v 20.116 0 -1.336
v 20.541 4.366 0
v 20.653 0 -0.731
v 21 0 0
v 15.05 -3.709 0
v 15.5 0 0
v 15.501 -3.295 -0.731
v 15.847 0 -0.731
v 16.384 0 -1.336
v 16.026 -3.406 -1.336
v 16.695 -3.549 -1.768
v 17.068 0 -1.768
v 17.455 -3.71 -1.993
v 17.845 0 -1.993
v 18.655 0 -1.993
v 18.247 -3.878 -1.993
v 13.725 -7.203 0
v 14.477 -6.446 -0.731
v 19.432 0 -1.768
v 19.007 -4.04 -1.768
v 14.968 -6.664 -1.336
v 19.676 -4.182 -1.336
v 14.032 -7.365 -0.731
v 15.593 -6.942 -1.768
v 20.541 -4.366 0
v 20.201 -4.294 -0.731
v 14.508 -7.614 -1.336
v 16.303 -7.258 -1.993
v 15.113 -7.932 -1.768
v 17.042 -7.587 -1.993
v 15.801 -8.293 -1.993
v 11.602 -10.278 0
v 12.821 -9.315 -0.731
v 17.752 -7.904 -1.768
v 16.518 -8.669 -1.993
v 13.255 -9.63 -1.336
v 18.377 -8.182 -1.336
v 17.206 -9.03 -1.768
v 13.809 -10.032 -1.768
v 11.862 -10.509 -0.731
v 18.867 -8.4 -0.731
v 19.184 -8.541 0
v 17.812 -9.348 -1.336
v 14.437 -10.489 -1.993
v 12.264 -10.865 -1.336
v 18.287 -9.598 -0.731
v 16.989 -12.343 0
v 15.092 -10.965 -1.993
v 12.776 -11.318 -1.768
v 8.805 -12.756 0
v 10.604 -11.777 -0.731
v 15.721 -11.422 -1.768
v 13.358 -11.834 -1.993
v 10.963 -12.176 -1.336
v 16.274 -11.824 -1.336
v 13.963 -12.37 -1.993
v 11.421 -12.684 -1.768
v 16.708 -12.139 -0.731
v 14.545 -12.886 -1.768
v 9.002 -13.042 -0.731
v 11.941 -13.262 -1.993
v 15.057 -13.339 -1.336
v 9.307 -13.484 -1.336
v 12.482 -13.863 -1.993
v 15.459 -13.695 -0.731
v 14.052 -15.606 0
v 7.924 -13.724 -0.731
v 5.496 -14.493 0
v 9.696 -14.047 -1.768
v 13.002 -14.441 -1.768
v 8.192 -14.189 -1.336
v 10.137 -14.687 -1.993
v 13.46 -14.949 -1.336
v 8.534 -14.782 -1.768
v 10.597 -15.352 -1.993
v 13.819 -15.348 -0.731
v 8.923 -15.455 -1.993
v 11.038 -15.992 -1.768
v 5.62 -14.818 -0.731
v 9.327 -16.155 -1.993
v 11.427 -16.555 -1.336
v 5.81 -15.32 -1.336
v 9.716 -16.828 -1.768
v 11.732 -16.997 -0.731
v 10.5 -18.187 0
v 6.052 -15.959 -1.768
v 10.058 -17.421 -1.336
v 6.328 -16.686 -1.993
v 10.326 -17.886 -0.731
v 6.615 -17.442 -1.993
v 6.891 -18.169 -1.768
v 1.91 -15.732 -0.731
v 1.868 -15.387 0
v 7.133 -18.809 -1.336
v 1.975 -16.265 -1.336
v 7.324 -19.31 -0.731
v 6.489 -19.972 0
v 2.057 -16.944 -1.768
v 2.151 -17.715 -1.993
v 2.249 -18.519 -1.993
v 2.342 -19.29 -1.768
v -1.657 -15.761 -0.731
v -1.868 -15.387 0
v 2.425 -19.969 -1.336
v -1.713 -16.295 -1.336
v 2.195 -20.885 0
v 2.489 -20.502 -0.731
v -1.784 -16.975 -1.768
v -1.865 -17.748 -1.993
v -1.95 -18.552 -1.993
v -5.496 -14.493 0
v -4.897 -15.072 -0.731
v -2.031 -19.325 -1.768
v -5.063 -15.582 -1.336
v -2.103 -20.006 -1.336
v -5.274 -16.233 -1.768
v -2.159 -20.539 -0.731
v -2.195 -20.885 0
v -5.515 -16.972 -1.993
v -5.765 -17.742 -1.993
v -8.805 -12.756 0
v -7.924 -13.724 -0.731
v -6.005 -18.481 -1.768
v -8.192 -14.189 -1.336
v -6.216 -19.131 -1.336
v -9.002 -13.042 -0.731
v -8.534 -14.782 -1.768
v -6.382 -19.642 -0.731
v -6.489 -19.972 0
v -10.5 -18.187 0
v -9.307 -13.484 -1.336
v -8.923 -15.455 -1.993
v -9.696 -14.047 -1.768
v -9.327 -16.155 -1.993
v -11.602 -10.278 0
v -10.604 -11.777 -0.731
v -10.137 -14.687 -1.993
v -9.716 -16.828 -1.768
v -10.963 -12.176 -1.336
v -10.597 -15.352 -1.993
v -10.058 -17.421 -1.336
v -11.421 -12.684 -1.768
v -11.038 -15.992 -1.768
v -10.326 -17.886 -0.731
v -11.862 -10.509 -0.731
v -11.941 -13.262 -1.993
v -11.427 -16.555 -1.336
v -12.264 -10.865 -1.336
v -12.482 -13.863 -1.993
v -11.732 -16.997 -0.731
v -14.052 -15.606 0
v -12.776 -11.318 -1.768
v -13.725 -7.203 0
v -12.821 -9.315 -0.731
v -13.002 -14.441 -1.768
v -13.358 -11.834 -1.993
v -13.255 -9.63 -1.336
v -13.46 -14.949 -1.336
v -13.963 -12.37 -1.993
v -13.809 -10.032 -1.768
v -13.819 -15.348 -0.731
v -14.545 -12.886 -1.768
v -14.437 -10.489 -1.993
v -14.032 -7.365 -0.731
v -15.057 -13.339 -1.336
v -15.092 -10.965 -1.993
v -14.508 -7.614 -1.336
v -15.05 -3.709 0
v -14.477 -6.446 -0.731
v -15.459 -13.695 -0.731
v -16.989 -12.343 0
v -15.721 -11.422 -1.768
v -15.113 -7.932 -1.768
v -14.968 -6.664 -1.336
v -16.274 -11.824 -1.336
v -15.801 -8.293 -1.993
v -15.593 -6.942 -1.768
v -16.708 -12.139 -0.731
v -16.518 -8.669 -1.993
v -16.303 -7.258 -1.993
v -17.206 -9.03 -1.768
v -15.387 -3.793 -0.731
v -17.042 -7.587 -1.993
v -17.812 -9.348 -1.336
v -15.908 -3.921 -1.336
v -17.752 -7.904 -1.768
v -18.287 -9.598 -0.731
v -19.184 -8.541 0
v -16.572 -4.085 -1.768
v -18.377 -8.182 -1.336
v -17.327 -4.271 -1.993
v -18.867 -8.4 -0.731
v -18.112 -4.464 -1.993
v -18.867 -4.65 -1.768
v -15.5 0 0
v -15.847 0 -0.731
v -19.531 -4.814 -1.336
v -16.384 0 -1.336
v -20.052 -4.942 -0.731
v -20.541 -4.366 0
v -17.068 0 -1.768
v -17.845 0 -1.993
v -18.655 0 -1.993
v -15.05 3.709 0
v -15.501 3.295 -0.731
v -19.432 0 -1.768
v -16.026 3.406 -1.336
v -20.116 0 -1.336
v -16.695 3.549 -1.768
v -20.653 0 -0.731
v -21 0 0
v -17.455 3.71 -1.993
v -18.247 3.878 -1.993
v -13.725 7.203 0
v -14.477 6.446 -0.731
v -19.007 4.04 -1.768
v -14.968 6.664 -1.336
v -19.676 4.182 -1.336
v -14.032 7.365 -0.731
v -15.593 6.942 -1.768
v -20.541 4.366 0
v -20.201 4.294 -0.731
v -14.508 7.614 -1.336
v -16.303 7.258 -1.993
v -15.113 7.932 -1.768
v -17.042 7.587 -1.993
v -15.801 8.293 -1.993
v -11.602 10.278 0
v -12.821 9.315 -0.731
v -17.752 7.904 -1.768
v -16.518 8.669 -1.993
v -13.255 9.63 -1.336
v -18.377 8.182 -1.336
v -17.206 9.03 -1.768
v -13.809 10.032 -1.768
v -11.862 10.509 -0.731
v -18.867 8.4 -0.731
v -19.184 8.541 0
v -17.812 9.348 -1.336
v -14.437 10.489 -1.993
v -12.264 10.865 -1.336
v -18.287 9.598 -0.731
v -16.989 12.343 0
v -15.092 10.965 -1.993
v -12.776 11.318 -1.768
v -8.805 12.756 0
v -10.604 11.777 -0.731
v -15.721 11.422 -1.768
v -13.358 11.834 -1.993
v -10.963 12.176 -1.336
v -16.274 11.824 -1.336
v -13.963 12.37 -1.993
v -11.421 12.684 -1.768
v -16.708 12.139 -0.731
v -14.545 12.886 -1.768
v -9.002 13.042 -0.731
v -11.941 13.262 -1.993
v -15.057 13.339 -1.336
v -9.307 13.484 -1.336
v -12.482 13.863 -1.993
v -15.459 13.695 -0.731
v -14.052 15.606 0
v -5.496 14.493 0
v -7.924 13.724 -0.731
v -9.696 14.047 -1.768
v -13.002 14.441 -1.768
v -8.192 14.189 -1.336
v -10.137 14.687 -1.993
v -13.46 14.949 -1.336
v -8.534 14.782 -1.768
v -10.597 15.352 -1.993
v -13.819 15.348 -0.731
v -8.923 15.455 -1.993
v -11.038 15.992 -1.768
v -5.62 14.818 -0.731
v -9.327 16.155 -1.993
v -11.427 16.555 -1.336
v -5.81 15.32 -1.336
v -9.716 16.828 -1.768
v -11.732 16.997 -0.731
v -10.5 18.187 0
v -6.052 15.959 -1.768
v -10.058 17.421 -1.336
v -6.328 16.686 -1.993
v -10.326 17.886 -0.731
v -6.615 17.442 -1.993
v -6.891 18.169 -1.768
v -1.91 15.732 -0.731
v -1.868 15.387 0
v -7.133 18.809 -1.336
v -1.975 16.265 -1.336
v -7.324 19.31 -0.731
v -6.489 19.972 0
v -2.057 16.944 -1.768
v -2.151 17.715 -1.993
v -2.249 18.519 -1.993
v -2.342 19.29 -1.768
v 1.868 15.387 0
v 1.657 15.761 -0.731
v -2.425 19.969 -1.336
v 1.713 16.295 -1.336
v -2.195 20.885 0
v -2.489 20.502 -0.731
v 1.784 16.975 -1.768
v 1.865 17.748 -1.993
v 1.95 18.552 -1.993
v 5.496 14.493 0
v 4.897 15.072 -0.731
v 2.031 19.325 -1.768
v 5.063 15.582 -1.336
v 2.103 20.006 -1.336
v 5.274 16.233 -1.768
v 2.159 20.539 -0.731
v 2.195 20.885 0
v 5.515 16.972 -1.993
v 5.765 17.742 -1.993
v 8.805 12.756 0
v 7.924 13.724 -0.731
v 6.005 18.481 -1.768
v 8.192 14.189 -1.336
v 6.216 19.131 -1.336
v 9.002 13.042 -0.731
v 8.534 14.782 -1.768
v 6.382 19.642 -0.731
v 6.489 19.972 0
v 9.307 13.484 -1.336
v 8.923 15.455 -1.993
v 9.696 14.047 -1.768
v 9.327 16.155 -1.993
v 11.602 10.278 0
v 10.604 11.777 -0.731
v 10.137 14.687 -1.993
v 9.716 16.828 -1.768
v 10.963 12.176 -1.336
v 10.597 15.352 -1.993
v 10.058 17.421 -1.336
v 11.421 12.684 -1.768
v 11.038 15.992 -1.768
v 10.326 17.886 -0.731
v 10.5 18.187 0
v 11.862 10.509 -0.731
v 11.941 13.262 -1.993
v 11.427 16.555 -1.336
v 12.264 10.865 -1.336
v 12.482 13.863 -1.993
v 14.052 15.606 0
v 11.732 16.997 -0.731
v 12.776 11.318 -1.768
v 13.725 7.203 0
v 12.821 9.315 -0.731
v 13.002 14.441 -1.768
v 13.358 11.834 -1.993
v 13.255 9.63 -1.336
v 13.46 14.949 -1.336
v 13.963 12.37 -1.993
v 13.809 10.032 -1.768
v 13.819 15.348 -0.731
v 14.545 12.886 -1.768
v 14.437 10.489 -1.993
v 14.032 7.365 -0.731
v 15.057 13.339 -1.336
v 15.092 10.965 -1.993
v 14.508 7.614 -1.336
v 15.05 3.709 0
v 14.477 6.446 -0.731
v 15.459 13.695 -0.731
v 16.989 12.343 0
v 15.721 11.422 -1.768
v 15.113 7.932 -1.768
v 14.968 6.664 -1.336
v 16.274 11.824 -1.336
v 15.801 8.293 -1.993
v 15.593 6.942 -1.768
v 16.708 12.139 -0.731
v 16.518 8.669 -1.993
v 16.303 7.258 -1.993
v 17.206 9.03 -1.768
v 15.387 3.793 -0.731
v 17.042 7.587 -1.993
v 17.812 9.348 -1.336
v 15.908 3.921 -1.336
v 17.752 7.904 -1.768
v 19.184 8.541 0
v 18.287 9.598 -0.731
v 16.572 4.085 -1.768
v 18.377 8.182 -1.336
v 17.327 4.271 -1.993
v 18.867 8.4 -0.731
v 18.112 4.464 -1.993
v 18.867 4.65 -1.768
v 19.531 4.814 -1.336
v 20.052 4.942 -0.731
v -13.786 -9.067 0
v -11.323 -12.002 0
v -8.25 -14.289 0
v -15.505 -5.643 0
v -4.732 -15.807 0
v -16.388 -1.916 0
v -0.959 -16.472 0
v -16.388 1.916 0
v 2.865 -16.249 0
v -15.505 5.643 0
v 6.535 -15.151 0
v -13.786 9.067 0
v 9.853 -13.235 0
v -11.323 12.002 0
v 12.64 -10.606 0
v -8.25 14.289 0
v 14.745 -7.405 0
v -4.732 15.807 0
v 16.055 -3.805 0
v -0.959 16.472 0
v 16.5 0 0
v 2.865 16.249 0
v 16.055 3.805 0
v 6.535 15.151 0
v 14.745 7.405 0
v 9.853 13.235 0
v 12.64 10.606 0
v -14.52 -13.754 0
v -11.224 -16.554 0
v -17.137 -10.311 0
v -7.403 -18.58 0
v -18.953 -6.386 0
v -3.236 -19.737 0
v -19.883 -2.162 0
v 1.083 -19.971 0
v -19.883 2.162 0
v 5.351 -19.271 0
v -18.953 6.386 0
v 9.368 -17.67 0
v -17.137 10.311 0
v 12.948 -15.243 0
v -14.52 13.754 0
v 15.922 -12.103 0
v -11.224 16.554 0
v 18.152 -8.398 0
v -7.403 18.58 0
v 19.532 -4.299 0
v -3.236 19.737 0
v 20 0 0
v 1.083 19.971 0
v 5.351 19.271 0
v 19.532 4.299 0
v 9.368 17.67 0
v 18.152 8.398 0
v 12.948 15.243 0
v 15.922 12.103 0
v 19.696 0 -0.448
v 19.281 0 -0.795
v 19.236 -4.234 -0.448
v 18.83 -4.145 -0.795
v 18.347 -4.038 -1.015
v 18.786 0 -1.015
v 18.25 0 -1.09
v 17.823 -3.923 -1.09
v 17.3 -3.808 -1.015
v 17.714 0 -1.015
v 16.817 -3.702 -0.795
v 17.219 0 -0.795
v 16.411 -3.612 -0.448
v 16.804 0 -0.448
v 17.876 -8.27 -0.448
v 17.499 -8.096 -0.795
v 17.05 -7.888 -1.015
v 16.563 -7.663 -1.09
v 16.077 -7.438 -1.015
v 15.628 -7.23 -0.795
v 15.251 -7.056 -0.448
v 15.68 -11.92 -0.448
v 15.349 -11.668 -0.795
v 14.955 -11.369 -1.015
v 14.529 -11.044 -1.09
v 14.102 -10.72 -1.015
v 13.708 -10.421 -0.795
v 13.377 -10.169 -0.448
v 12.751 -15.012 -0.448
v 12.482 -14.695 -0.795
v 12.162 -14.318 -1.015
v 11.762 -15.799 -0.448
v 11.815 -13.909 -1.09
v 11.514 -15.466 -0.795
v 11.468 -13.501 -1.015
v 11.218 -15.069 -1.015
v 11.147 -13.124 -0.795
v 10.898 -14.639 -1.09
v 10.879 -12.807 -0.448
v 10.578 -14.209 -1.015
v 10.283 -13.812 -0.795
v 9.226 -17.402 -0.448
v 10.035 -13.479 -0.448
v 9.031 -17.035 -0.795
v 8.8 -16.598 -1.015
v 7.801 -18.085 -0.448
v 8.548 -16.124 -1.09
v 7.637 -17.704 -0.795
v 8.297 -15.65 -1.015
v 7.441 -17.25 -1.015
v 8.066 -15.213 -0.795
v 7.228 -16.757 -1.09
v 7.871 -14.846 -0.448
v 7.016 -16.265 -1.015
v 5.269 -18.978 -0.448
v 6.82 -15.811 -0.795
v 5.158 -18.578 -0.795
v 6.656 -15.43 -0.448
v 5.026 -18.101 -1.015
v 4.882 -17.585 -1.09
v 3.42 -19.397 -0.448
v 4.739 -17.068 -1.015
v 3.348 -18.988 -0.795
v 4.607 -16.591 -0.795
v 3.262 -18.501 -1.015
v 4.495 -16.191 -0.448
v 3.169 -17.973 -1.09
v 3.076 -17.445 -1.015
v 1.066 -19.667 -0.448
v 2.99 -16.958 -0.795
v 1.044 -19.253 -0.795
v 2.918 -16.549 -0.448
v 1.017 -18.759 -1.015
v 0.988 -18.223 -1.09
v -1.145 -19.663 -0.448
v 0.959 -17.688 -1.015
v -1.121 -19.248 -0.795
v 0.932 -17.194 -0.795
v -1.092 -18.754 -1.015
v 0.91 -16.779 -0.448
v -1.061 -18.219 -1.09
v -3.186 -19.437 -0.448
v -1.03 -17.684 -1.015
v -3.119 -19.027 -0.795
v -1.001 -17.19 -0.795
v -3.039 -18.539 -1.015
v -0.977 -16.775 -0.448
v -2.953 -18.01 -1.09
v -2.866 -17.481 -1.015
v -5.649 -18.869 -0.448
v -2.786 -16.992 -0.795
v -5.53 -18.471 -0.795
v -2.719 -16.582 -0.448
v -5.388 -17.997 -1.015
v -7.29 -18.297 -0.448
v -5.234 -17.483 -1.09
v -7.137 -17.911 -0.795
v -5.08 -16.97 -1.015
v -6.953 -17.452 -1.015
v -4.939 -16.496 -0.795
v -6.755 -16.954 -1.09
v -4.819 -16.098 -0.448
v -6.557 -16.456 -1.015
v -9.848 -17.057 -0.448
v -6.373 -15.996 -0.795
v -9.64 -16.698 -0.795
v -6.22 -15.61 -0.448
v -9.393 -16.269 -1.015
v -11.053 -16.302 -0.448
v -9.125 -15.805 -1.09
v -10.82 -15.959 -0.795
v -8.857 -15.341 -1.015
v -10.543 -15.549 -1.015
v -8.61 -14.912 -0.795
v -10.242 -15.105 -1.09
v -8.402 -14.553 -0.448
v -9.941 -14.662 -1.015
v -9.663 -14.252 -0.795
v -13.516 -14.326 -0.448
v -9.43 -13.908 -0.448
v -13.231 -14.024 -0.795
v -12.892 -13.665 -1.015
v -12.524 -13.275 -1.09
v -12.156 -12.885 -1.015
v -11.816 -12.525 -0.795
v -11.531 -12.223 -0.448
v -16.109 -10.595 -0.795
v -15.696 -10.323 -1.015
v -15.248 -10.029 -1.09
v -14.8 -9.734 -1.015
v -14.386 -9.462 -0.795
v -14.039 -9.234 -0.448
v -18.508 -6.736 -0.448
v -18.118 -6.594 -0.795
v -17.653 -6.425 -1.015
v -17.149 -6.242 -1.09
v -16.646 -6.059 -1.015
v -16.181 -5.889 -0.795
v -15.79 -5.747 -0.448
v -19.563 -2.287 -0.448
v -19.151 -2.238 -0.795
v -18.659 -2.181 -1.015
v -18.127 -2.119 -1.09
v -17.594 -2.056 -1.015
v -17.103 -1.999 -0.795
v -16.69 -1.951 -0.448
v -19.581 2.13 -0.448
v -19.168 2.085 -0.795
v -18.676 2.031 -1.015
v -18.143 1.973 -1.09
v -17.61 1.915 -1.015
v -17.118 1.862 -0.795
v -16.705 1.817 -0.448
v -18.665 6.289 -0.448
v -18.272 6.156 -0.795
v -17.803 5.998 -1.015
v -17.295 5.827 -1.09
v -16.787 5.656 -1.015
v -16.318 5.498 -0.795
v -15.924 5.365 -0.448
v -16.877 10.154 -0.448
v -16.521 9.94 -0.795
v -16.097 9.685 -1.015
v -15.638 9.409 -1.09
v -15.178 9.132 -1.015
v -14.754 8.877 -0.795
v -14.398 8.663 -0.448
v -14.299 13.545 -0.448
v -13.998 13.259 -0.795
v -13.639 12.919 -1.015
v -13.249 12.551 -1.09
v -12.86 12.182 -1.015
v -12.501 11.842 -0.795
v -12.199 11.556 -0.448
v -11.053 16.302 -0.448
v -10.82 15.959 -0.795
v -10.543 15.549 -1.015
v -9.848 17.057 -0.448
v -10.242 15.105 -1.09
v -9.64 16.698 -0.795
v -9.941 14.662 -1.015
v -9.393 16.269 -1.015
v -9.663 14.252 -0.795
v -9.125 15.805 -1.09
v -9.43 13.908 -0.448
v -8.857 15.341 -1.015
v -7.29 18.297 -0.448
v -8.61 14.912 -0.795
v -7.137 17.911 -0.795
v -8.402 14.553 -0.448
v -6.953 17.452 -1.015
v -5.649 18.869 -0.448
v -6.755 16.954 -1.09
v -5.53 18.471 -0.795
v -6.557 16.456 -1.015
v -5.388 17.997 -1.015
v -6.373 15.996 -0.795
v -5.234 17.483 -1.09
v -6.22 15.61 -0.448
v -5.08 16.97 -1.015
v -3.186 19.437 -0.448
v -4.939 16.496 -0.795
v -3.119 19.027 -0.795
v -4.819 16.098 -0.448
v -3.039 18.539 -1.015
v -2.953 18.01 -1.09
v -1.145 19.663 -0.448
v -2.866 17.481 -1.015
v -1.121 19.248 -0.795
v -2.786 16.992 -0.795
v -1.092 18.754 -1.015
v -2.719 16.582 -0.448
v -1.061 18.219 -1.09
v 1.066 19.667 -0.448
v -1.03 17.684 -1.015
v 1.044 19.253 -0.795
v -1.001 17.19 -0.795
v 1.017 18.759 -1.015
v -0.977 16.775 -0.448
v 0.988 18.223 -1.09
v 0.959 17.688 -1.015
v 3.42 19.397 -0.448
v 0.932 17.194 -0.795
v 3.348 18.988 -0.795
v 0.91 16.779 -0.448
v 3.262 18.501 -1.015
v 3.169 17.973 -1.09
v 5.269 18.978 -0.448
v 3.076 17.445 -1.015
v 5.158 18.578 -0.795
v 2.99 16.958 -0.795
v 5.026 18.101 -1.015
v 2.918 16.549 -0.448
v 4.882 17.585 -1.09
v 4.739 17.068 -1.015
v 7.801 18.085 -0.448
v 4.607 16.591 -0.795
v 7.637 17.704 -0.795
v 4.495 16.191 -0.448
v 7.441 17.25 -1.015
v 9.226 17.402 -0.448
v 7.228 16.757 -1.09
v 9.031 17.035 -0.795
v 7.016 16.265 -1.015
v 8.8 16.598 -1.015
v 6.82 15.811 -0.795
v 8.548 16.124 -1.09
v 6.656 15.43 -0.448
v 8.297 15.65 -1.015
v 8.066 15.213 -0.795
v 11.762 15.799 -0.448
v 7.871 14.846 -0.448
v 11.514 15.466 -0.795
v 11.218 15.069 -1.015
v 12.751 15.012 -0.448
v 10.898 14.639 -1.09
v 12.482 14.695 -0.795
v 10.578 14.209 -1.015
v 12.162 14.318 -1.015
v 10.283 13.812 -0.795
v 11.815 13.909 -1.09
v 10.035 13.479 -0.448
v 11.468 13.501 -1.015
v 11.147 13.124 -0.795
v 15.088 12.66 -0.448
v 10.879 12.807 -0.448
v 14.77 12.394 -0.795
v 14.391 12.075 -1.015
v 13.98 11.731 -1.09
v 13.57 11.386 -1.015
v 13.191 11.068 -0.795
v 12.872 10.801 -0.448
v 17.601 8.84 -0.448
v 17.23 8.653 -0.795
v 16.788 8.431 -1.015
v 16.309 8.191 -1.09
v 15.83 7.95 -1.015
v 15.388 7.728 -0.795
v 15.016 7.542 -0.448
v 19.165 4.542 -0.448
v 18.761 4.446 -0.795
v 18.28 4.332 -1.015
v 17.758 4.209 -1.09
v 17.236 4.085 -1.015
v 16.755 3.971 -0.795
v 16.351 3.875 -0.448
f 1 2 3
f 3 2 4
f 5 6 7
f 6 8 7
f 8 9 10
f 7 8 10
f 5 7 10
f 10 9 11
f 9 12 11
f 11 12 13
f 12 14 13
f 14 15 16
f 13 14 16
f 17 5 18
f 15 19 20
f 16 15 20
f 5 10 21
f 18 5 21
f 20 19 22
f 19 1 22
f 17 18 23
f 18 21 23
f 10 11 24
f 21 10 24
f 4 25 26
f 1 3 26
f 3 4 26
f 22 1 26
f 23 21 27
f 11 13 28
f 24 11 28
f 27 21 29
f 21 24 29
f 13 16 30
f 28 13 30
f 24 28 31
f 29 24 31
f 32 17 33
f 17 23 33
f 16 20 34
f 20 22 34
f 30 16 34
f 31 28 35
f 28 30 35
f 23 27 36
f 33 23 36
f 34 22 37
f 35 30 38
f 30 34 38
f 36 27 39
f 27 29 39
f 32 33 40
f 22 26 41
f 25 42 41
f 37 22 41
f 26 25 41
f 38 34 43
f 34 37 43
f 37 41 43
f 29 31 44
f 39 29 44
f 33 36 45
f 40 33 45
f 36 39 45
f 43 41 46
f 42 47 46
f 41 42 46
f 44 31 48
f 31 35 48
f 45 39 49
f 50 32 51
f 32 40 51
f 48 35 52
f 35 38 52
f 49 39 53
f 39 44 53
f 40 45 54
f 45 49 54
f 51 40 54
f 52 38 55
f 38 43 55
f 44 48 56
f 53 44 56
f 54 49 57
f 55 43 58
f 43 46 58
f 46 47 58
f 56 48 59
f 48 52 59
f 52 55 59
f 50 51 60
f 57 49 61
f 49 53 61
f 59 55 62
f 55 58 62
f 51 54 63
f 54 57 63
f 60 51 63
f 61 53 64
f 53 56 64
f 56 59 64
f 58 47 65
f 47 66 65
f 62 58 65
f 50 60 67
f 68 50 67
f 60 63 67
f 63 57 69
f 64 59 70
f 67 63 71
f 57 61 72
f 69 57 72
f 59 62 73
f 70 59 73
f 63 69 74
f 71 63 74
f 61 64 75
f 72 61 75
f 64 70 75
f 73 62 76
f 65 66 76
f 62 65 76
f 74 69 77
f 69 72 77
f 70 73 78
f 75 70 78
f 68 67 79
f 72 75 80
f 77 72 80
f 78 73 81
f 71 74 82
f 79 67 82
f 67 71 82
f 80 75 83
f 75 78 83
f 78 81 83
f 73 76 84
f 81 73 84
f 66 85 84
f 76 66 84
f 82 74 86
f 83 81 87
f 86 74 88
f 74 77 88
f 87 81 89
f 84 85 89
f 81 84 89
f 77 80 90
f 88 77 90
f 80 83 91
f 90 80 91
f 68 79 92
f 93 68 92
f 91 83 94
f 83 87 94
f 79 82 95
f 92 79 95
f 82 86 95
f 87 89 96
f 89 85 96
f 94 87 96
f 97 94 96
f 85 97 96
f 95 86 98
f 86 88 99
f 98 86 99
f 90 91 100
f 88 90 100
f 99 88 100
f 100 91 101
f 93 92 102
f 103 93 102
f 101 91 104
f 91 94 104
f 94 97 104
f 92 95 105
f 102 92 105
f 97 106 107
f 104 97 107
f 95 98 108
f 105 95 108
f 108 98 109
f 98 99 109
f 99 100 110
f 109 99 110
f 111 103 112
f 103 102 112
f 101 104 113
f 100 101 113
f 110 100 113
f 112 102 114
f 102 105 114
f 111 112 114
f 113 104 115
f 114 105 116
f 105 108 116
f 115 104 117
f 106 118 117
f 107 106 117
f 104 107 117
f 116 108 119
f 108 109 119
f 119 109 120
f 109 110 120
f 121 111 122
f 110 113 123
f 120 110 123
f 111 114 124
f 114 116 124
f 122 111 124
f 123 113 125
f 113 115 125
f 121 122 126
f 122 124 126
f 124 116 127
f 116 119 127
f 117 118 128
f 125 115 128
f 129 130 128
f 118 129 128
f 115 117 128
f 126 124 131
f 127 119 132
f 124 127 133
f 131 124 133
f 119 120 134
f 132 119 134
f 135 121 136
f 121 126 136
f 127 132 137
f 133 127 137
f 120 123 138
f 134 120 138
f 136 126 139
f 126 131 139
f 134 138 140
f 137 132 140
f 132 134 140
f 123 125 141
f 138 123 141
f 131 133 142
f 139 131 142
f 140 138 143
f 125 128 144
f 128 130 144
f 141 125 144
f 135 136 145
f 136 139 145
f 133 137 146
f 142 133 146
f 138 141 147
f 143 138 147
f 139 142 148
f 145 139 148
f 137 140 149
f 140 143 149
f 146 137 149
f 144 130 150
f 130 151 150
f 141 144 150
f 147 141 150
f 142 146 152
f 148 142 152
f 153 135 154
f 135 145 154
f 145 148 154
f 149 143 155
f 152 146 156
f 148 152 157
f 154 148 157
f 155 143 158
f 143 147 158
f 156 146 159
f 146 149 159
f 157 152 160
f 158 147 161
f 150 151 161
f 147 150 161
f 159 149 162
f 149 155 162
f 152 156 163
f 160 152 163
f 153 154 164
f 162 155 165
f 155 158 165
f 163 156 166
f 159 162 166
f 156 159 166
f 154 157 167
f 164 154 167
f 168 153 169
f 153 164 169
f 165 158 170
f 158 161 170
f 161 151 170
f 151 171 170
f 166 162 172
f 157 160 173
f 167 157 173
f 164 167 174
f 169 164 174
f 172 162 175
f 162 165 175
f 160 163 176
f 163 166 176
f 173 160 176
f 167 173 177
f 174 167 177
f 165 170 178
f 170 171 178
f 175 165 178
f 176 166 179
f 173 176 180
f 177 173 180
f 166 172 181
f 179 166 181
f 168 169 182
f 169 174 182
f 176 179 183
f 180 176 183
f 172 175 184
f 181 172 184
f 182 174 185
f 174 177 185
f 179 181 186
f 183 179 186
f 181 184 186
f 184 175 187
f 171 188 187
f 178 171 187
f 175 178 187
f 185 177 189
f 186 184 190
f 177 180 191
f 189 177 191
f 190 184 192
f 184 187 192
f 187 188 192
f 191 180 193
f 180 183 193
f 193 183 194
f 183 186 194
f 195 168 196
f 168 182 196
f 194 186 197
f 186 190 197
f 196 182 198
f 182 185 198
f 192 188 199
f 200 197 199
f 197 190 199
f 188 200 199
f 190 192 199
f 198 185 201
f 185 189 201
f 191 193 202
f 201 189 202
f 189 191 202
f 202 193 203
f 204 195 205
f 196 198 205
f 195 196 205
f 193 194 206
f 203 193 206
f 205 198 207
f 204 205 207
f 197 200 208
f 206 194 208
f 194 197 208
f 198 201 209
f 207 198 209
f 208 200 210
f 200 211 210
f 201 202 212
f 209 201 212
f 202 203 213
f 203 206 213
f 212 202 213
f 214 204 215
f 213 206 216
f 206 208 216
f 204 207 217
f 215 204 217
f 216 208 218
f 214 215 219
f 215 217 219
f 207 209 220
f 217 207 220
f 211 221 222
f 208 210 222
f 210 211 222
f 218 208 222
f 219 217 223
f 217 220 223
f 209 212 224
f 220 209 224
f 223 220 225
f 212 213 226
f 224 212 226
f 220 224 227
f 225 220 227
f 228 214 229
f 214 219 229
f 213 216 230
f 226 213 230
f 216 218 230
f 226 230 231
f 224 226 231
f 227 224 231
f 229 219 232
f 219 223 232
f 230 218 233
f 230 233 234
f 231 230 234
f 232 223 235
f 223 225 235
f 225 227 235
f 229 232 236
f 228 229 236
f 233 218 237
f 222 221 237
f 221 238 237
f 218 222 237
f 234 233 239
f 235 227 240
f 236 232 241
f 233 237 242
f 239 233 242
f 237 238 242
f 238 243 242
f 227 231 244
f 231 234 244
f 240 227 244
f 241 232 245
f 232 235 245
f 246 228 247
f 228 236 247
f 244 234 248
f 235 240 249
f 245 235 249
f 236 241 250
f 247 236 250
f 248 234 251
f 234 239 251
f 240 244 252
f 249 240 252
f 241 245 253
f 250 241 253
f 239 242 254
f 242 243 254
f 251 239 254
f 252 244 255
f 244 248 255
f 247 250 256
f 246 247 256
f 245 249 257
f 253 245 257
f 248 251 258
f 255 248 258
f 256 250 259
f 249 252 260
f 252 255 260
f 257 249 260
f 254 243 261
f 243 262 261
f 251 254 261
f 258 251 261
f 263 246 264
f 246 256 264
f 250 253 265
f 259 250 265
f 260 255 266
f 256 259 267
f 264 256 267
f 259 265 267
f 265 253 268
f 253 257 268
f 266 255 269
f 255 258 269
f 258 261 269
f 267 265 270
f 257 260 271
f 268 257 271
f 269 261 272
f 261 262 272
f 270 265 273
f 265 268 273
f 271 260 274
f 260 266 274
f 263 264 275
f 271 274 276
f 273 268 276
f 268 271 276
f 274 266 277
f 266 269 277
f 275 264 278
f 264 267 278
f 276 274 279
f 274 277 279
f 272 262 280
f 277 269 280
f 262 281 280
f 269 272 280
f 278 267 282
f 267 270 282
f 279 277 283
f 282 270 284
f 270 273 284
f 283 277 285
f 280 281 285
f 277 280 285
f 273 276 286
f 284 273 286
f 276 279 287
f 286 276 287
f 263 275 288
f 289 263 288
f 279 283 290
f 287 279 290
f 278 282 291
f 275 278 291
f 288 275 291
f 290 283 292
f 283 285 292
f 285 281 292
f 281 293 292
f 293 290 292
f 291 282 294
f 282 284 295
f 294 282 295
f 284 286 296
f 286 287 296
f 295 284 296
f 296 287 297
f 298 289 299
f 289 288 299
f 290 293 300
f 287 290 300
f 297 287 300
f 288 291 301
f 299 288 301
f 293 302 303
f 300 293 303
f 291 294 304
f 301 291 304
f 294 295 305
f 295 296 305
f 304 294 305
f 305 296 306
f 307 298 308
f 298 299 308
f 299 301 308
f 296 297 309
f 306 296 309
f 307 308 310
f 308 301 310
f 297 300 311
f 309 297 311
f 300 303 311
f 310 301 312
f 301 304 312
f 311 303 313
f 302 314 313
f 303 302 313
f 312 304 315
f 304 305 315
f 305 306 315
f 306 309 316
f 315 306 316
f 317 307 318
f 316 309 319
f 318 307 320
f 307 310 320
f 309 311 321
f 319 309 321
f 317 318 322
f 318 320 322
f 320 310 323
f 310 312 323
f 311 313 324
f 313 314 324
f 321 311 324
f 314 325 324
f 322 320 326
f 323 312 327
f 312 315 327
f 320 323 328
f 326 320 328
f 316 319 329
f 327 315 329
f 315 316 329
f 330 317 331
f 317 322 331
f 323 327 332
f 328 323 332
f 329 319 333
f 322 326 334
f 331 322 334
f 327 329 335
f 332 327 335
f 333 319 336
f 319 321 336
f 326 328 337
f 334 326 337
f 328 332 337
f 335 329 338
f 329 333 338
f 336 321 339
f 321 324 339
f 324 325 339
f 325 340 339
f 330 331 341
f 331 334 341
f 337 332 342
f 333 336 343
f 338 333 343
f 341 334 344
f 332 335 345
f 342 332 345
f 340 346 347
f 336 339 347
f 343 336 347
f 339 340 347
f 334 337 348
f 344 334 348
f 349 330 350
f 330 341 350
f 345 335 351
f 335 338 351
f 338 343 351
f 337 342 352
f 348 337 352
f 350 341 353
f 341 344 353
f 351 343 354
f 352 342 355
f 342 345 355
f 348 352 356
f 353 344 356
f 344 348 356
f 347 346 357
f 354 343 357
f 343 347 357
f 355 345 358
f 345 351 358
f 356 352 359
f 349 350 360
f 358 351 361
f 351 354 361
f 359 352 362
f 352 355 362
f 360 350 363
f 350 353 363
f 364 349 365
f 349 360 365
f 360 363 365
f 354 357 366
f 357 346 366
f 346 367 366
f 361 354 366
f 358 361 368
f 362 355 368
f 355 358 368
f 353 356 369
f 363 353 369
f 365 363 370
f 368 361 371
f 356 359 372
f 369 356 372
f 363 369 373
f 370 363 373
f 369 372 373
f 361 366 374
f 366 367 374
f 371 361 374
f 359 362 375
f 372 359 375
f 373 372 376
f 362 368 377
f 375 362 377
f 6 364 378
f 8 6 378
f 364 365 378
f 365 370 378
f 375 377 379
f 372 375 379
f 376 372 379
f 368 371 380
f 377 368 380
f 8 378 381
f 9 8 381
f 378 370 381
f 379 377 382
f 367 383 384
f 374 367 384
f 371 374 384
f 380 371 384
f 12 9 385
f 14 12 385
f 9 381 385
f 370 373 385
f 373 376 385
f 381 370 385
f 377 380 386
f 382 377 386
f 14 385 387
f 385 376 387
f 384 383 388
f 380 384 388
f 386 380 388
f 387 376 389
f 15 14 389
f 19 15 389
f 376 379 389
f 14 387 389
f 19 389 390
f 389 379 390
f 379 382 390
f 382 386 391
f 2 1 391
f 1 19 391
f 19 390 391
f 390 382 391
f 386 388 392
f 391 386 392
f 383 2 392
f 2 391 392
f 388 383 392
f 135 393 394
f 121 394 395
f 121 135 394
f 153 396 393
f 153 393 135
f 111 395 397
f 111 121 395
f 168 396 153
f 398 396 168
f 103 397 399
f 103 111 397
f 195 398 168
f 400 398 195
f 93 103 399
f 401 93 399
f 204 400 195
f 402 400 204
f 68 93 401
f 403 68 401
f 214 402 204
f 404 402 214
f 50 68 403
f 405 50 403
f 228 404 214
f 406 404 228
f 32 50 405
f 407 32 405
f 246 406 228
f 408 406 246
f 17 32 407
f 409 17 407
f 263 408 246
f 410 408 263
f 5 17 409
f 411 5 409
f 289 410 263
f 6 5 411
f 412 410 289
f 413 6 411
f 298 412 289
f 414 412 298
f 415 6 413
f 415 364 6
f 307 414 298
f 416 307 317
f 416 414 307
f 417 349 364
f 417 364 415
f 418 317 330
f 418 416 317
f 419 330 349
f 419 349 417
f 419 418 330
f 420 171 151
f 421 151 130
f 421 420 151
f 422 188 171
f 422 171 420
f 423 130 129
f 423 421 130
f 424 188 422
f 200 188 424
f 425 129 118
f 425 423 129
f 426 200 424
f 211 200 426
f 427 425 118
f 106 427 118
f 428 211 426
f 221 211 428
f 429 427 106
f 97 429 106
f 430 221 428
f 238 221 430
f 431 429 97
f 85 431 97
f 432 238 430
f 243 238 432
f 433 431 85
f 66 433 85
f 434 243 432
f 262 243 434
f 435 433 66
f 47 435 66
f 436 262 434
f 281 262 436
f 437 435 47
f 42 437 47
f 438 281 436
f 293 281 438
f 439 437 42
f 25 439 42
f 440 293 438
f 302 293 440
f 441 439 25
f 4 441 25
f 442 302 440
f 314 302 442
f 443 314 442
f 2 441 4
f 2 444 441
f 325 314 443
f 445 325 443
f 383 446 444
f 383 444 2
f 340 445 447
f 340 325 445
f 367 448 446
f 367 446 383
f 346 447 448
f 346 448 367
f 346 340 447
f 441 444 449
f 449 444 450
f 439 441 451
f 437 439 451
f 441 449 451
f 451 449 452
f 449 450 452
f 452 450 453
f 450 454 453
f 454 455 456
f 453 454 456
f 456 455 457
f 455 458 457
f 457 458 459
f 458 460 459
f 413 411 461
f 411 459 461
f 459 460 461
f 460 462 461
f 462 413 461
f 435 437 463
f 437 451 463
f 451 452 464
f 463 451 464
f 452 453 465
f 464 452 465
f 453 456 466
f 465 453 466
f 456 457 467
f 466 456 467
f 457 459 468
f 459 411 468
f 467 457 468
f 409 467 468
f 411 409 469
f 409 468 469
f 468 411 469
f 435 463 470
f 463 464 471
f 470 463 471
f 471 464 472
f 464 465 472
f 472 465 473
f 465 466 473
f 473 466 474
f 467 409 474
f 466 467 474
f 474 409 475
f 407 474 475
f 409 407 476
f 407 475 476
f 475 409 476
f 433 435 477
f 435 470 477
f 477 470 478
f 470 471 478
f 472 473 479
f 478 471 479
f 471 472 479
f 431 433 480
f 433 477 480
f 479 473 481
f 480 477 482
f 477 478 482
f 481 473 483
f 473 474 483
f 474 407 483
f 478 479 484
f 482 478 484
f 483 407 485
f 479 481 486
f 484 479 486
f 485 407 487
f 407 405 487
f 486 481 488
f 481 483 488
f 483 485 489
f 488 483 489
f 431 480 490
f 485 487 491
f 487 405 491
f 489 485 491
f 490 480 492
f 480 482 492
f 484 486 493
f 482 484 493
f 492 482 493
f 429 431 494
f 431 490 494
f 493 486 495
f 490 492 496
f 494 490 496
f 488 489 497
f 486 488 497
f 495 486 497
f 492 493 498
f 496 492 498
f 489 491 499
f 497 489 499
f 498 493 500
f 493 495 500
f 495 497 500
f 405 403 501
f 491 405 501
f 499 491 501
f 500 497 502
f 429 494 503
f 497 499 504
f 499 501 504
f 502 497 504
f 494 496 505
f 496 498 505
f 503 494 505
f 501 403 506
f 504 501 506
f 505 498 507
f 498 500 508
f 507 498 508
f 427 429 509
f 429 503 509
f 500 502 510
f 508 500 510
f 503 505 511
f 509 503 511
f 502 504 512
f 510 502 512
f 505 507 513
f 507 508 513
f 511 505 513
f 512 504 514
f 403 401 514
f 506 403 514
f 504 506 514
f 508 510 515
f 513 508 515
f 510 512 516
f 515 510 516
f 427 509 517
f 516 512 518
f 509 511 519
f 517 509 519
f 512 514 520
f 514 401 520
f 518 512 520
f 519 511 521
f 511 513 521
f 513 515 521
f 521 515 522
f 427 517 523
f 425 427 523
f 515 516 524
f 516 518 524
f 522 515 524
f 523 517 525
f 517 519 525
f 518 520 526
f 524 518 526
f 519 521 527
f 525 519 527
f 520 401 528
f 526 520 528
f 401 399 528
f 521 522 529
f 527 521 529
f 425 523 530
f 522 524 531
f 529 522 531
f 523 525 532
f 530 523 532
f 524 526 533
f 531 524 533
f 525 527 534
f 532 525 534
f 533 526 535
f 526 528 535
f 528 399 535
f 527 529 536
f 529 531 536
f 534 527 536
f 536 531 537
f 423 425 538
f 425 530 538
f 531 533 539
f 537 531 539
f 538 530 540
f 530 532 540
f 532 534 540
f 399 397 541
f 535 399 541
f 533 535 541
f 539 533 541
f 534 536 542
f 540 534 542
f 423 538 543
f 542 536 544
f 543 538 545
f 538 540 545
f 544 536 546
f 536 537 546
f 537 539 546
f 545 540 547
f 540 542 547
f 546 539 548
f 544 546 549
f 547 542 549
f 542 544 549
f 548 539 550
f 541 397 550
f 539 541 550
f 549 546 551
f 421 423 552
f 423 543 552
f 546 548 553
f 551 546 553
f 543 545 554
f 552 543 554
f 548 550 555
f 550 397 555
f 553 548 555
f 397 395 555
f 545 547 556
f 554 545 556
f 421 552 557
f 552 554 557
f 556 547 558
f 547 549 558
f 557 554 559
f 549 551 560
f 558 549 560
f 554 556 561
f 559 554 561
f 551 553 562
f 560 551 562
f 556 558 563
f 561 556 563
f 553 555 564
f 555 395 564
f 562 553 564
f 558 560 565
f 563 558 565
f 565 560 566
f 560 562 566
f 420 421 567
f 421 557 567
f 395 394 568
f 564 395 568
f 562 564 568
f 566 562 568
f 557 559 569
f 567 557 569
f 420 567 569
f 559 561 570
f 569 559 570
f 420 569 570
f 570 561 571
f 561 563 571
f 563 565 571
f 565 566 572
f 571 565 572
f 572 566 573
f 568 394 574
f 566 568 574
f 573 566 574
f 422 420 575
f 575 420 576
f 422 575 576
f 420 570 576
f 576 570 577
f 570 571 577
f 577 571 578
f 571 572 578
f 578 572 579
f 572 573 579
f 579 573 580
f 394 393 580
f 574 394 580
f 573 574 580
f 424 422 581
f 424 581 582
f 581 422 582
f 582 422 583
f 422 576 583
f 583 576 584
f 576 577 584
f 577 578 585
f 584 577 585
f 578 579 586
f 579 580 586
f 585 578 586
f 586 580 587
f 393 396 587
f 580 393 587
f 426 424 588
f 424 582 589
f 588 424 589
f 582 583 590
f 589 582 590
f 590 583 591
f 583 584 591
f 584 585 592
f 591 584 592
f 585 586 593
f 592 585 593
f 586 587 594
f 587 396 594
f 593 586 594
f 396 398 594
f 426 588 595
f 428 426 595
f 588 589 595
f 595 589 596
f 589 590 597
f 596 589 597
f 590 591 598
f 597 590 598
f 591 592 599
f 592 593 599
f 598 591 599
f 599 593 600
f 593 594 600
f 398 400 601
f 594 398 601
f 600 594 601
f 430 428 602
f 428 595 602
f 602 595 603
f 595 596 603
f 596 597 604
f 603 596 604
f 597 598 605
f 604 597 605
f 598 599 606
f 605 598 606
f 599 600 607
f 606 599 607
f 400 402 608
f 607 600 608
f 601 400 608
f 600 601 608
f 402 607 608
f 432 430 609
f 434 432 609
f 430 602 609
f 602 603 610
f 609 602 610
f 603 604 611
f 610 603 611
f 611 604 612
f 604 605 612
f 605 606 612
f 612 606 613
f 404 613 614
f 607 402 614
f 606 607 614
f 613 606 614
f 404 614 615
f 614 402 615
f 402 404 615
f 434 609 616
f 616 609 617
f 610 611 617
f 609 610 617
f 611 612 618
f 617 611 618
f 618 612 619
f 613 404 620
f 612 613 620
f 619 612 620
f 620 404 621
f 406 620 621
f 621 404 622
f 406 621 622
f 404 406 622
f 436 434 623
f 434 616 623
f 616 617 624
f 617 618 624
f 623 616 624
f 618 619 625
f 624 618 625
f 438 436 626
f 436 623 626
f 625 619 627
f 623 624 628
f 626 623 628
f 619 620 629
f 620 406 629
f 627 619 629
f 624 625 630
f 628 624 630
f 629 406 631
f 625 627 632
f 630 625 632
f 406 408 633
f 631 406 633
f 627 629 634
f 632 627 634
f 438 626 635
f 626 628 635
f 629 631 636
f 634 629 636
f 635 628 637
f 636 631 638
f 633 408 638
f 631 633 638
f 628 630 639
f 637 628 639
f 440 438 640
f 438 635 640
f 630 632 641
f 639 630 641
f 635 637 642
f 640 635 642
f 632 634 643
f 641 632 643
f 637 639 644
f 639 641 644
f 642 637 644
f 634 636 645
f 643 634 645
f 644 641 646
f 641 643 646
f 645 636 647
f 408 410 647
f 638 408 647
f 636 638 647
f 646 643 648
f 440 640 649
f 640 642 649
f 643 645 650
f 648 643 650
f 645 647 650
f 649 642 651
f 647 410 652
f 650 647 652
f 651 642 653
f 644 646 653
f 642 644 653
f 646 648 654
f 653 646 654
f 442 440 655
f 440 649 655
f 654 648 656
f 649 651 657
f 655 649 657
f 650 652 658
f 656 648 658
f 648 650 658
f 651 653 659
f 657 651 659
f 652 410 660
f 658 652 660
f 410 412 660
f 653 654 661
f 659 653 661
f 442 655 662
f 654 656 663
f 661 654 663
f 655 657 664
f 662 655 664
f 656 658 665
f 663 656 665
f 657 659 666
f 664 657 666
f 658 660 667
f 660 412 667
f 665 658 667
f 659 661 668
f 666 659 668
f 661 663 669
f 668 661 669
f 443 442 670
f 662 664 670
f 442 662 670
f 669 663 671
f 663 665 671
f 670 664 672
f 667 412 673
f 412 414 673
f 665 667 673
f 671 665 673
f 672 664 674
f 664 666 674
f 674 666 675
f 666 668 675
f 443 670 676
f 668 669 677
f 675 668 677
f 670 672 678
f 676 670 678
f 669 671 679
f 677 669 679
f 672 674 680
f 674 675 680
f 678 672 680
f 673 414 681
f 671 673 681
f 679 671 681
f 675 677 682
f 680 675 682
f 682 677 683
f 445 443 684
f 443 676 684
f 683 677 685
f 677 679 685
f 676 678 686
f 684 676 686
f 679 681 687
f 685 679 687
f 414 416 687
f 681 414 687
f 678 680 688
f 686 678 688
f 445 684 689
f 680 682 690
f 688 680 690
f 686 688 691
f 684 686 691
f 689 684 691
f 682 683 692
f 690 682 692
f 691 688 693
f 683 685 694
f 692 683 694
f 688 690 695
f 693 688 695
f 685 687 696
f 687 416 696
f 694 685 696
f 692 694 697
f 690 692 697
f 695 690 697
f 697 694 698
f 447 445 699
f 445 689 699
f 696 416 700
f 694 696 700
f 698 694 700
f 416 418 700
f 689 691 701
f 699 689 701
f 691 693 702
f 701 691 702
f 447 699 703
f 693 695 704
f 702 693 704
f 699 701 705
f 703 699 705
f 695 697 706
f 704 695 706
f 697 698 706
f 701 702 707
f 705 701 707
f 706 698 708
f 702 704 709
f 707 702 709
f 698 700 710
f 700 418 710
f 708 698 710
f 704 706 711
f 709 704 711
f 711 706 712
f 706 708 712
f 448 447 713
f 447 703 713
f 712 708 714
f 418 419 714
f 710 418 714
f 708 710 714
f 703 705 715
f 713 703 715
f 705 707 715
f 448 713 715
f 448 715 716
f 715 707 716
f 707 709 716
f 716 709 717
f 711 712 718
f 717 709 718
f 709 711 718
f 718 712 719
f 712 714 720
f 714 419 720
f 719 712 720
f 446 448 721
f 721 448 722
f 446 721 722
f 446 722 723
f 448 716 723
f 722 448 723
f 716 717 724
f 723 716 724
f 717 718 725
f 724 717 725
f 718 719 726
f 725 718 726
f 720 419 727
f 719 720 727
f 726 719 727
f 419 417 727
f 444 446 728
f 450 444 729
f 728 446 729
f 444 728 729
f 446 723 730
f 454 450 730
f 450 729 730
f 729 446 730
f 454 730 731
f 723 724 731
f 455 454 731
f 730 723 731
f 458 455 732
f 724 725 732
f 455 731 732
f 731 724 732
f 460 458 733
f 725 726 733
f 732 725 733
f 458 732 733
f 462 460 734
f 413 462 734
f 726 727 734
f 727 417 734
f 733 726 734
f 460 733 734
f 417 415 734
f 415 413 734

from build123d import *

# Parameters (mm, degrees)
SKETCH_1_R          = 21
SKETCH_1_R_2        = 15.5
EXTRUDE_1_DEPTH     = 2
CUT_EXTRUDE_START   = -2
SKETCH_3_R          = 21
CUT_EXTRUDE_1_DEPTH = 2


with BuildPart() as part:
    # 草图1 → 凸台-拉伸1 (new body)
    with BuildSketch(Plane.XY):
        Circle(SKETCH_1_R)
        Circle(SKETCH_1_R_2, mode=Mode.SUBTRACT)
    extrude(amount=EXTRUDE_1_DEPTH)

    # 草图2 → 旋转1 (revolve)
    with BuildSketch(Plane(origin=(0, 0, 0), x_dir=(1, 0, 0), z_dir=(0, 1, 0)), mode=Mode.PRIVATE) as revolve_1_sk:
        with BuildLine():
            Line((-21, 0), (-20, 0))
            ThreePointArc((-20, 0), (-18.25, 1.090097064), (-16.5, 0))
            Line((-16.5, 0), (-15.5, 0))
            ThreePointArc((-15.5, 0), (-18.25, 2.021587034), (-21, 0))
        make_face()
    revolve(revolve_1_sk.sketch.rotate(Axis((0, 0, 0), (0, 0, -1)), 180), axis=Axis((0, 0, 0), (0, 0, -1)))

    # 草图3 → 切除-拉伸1 (cut)
    with BuildSketch(Plane.XY.offset(2).offset(CUT_EXTRUDE_START)):
        Circle(SKETCH_3_R)
    extrude(amount=CUT_EXTRUDE_1_DEPTH, mode=Mode.SUBTRACT)


solid = part.part
